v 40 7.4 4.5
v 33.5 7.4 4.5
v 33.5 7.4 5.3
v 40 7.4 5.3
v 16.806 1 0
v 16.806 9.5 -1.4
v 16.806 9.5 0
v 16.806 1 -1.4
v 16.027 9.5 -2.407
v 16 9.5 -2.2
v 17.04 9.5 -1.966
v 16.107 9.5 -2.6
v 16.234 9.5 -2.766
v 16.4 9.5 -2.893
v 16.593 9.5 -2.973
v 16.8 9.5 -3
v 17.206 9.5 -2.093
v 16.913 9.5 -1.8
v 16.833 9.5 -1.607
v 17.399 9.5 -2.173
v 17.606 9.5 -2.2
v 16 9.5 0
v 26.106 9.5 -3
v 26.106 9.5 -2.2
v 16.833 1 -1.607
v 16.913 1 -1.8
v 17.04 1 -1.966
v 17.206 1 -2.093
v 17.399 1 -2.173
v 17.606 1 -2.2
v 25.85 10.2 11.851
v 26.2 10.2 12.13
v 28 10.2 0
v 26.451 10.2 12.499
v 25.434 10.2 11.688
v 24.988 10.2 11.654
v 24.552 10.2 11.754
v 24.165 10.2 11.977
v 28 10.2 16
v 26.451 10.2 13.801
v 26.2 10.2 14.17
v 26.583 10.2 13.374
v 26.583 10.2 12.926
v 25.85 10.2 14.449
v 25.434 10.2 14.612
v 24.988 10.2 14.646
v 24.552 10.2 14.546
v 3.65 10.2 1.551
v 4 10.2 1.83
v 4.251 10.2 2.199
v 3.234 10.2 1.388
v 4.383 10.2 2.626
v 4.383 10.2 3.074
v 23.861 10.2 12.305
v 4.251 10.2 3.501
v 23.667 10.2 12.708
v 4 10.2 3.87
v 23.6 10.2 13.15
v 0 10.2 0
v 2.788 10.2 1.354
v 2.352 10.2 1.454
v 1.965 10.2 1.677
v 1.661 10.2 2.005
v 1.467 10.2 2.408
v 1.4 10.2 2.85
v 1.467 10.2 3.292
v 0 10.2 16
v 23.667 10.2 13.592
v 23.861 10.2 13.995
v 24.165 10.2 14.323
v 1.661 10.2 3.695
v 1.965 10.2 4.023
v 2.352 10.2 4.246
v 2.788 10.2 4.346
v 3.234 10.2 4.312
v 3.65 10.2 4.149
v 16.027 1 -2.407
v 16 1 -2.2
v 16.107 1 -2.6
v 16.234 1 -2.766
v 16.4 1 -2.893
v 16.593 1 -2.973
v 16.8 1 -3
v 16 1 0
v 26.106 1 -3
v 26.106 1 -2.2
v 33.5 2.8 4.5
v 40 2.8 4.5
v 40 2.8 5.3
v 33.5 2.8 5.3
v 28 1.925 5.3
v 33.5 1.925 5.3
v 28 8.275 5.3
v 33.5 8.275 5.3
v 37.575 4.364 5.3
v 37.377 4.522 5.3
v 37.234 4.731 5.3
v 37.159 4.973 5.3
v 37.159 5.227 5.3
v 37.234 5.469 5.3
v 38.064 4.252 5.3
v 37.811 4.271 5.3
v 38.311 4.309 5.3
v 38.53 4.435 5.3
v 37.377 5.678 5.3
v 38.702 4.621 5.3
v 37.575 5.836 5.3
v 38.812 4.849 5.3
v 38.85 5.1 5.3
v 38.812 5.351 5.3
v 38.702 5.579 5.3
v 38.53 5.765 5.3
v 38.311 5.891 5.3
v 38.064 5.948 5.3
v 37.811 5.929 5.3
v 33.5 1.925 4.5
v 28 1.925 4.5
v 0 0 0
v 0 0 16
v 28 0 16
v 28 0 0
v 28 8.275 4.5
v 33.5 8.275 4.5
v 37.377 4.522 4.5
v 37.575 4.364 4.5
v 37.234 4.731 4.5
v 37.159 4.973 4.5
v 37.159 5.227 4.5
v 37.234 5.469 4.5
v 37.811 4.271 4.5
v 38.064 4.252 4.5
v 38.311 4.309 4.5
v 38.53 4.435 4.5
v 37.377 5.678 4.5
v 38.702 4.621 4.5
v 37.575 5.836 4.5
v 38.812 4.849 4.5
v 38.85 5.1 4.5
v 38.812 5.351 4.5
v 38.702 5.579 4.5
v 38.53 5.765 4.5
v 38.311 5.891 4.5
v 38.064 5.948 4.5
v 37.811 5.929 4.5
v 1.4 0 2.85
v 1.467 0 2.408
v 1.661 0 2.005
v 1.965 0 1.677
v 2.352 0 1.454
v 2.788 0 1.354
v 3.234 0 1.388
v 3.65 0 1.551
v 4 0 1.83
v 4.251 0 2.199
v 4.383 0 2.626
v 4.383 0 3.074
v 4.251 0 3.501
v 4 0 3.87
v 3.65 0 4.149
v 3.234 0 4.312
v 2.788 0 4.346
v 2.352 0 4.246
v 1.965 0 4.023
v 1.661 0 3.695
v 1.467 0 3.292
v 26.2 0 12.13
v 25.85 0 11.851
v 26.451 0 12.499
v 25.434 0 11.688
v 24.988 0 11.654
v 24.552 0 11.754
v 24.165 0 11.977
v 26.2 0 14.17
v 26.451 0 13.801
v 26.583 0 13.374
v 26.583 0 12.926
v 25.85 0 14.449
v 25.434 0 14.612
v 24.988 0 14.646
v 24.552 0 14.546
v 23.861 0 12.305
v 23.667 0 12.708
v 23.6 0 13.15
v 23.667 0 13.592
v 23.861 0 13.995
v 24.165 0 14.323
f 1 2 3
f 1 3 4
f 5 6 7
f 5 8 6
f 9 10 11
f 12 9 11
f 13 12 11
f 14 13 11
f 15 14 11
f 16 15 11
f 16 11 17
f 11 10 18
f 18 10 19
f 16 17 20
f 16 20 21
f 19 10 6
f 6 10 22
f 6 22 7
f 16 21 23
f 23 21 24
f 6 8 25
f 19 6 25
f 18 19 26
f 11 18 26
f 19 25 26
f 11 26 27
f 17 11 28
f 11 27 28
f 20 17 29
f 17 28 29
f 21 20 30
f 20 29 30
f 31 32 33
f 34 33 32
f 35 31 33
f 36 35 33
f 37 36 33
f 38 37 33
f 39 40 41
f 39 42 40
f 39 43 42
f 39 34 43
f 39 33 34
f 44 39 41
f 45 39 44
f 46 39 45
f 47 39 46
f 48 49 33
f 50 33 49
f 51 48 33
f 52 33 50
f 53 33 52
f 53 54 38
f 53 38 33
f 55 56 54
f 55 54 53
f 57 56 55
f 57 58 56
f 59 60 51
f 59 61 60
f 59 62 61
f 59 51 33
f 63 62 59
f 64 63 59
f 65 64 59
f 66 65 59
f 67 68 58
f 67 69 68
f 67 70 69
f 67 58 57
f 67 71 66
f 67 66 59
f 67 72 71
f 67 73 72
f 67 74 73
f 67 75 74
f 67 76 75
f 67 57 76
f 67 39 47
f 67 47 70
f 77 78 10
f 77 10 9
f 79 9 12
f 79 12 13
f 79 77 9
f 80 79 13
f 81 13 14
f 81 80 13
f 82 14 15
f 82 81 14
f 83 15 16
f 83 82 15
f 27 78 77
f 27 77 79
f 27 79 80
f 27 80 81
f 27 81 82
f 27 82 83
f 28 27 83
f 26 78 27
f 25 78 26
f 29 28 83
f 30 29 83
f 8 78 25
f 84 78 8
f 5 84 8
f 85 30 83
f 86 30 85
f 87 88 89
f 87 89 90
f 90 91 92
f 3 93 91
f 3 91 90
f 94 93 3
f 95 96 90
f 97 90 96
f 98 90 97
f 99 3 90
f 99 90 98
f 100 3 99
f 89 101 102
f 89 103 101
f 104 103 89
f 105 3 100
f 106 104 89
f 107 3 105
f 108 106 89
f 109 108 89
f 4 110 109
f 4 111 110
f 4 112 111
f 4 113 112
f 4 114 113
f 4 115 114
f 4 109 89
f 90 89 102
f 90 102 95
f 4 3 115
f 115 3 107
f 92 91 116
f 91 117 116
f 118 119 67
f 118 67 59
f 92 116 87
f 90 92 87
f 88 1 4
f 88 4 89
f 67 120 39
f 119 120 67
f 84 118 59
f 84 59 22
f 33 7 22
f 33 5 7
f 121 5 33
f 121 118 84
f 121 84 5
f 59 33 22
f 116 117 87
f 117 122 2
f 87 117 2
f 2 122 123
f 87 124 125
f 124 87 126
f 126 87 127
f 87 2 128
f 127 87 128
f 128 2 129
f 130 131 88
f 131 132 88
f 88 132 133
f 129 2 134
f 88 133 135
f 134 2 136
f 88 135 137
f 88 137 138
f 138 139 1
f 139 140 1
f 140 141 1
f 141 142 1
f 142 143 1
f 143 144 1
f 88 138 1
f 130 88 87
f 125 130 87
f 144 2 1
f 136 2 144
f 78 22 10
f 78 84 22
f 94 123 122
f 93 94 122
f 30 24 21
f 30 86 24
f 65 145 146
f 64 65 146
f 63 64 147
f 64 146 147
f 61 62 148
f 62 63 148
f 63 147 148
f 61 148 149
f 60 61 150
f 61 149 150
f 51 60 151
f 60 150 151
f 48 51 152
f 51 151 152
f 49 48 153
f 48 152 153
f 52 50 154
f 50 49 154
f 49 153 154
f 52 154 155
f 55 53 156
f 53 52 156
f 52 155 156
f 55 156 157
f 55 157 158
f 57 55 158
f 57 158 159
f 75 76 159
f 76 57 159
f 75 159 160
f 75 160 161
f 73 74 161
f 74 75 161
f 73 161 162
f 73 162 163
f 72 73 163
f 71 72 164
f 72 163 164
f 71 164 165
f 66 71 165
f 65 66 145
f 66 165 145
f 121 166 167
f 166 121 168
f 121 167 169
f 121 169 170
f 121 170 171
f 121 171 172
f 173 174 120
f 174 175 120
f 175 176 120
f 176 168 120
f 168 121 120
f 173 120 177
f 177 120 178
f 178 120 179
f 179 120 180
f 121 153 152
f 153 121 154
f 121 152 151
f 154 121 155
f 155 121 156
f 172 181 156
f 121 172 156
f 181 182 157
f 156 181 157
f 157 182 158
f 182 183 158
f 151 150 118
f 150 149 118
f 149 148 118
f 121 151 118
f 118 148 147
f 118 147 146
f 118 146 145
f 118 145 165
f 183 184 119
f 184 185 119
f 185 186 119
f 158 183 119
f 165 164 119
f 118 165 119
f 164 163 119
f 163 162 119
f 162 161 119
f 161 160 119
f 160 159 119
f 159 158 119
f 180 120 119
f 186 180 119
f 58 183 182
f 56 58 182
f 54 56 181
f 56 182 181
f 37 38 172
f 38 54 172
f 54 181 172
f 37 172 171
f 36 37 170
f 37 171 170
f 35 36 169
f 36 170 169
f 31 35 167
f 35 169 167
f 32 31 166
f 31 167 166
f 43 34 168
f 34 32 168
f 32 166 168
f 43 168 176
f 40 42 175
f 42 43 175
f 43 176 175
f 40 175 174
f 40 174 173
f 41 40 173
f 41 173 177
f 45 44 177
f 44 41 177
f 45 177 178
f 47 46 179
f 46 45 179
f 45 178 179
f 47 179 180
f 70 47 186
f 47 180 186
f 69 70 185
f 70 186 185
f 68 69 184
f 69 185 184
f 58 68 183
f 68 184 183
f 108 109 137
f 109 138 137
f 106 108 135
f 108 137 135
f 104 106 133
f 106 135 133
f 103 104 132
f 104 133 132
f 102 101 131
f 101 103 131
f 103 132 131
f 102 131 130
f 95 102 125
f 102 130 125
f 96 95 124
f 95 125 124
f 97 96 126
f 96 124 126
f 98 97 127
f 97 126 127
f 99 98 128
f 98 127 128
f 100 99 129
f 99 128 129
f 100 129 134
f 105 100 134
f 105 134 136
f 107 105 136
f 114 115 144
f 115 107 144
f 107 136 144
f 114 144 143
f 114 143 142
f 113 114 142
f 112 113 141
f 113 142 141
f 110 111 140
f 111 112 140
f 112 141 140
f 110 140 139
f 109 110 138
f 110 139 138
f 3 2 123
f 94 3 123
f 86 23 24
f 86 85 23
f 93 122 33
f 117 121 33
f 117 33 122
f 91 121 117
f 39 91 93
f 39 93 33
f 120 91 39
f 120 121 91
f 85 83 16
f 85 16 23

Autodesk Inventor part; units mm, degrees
ref_plane "YZ Plane" through (0, 0, 0) normal (1, 0, 0) x (0, 1, 0)
ref_plane "XZ Plane" through (0, 0, 0) normal (0, 1, 0) x (-1, 0, 0)
sketch "Sketch1" plane through (0, 0, 0) normal (0, 1, 0) x (-1, 0, 0)
  line L0 (0, 0) -> (-28, 0)
  line L1 (-28, 0) -> (-28, 16)
  line L2 (-28, 16) -> (0, 16)
  line L3 (0, 16) -> (0, 0)
  circle A0 centre (-25.1, 13.15) radius 1.5
  circle A1 centre (-2.9, 2.85) radius 1.5
  line L4 (-28, 8) -> (0, 8) construction
  line L5 (-14, 0) -> (-14, 16) construction
  line L6 (-25.1, 13.15) -> (-28, 13.15) construction
  line L7 (-25.1, 13.15) -> (-25.1, 16) construction
  line L8 (-2.9, 2.85) -> (-2.9, 0) construction
  line L9 (-2.9, 2.85) -> (0, 2.85) construction
  dimension "d0" = 28
  dimension "d1" = 16
  dimension "d2" = 3
  dimension "d3" = 3
  dimension "d4" = 22.2
  dimension "d5" = 10.3
extrude "Extrusion1" add sketch "Sketch1" along normal blind 10.2
ref_plane "Work Plane1" through (0, 0, 4.5) normal (0, 0, 1) x (1, 0, 0)
sketch "Sketch2" plane through (0, 0, 4.5) normal (0, 0, 1) x (1, 0, 0)
  line L0 (28, 1.925) -> (33.5, 1.925)
  line L1 (33.5, 1.925) -> (33.5, 2.8)
  line L2 (33.5, 8.275) -> (28, 8.275)
  line L3 (28, 8.275) -> (28, 1.925)
  line L4 (33.5, 7.4) -> (40, 7.4)
  line L5 (40, 7.4) -> (40, 2.8)
  line L6 (40, 2.8) -> (33.5, 2.8)
  line L7 (33.5, 7.4) -> (33.5, 8.275)
  line L8 (33.5, 2.8) -> (33.5, 7.4) construction
  line L9 (28, 1.925) -> (28, 0) construction
  line L10 (28, 8.275) -> (28, 10.2) construction
  circle A0 centre (38, 5.1) radius 0.85
  line L11 (38, 5.1) -> (38, 2.8) construction
  line L12 (38, 7.4) -> (38, 5.1) construction
  point P0 (0, 0)
  dimension "d12" = 6.5
  dimension "d13" = 1.7
  dimension "d14" = 2
  dimension "d15" = 12
  dimension "d16" = 4.6
  dimension "d17" = 6.35
extrude "Extrusion2" add sketch "Sketch2" along normal blind 0.8
ref_plane "Work Plane2" through (0, 1, 0) normal (0, -1, 0) x (1, 0, 0)
sketch "Sketch4" plane through (0, 1, 0) normal (0, -1, 0) x (1, 0, 0)
  line L0 (16.8061, 0) -> (16, 0)
  line L1 (16, 0) -> (16, -2.2)
  line L2 (16.8, -3) -> (16.8, -3)
  line L3 (16.8, -3) -> (26.1061, -3)
  line L4 (26.1061, -3) -> (26.1061, -2.2)
  line L5 (26.1061, -2.2) -> (17.6061, -2.2)
  line L6 (16.8061, -1.4) -> (16.8061, 0)
  arc A0 (16, -2.2) -> (16.8, -3) centre (16.8, -2.2) ccw
  arc A1 (16.8061, -1.4) -> (17.6061, -2.2) centre (17.6061, -1.4) ccw
  line L7 (0, 0) -> (0, 16) projected
  point P0 (16, -3)
  point P1 (16.8061, -2.2)
  dimension "d32" = 0.8
  dimension "d33" = 3
  dimension "d34" = 9.3
  dimension "d35" = 0.8
  dimension "d36" = 0.8
  dimension "d41" = 16
extrude "Extrusion3" add sketch "Sketch4" against normal blind 8.5
properties part number "game-switch"
